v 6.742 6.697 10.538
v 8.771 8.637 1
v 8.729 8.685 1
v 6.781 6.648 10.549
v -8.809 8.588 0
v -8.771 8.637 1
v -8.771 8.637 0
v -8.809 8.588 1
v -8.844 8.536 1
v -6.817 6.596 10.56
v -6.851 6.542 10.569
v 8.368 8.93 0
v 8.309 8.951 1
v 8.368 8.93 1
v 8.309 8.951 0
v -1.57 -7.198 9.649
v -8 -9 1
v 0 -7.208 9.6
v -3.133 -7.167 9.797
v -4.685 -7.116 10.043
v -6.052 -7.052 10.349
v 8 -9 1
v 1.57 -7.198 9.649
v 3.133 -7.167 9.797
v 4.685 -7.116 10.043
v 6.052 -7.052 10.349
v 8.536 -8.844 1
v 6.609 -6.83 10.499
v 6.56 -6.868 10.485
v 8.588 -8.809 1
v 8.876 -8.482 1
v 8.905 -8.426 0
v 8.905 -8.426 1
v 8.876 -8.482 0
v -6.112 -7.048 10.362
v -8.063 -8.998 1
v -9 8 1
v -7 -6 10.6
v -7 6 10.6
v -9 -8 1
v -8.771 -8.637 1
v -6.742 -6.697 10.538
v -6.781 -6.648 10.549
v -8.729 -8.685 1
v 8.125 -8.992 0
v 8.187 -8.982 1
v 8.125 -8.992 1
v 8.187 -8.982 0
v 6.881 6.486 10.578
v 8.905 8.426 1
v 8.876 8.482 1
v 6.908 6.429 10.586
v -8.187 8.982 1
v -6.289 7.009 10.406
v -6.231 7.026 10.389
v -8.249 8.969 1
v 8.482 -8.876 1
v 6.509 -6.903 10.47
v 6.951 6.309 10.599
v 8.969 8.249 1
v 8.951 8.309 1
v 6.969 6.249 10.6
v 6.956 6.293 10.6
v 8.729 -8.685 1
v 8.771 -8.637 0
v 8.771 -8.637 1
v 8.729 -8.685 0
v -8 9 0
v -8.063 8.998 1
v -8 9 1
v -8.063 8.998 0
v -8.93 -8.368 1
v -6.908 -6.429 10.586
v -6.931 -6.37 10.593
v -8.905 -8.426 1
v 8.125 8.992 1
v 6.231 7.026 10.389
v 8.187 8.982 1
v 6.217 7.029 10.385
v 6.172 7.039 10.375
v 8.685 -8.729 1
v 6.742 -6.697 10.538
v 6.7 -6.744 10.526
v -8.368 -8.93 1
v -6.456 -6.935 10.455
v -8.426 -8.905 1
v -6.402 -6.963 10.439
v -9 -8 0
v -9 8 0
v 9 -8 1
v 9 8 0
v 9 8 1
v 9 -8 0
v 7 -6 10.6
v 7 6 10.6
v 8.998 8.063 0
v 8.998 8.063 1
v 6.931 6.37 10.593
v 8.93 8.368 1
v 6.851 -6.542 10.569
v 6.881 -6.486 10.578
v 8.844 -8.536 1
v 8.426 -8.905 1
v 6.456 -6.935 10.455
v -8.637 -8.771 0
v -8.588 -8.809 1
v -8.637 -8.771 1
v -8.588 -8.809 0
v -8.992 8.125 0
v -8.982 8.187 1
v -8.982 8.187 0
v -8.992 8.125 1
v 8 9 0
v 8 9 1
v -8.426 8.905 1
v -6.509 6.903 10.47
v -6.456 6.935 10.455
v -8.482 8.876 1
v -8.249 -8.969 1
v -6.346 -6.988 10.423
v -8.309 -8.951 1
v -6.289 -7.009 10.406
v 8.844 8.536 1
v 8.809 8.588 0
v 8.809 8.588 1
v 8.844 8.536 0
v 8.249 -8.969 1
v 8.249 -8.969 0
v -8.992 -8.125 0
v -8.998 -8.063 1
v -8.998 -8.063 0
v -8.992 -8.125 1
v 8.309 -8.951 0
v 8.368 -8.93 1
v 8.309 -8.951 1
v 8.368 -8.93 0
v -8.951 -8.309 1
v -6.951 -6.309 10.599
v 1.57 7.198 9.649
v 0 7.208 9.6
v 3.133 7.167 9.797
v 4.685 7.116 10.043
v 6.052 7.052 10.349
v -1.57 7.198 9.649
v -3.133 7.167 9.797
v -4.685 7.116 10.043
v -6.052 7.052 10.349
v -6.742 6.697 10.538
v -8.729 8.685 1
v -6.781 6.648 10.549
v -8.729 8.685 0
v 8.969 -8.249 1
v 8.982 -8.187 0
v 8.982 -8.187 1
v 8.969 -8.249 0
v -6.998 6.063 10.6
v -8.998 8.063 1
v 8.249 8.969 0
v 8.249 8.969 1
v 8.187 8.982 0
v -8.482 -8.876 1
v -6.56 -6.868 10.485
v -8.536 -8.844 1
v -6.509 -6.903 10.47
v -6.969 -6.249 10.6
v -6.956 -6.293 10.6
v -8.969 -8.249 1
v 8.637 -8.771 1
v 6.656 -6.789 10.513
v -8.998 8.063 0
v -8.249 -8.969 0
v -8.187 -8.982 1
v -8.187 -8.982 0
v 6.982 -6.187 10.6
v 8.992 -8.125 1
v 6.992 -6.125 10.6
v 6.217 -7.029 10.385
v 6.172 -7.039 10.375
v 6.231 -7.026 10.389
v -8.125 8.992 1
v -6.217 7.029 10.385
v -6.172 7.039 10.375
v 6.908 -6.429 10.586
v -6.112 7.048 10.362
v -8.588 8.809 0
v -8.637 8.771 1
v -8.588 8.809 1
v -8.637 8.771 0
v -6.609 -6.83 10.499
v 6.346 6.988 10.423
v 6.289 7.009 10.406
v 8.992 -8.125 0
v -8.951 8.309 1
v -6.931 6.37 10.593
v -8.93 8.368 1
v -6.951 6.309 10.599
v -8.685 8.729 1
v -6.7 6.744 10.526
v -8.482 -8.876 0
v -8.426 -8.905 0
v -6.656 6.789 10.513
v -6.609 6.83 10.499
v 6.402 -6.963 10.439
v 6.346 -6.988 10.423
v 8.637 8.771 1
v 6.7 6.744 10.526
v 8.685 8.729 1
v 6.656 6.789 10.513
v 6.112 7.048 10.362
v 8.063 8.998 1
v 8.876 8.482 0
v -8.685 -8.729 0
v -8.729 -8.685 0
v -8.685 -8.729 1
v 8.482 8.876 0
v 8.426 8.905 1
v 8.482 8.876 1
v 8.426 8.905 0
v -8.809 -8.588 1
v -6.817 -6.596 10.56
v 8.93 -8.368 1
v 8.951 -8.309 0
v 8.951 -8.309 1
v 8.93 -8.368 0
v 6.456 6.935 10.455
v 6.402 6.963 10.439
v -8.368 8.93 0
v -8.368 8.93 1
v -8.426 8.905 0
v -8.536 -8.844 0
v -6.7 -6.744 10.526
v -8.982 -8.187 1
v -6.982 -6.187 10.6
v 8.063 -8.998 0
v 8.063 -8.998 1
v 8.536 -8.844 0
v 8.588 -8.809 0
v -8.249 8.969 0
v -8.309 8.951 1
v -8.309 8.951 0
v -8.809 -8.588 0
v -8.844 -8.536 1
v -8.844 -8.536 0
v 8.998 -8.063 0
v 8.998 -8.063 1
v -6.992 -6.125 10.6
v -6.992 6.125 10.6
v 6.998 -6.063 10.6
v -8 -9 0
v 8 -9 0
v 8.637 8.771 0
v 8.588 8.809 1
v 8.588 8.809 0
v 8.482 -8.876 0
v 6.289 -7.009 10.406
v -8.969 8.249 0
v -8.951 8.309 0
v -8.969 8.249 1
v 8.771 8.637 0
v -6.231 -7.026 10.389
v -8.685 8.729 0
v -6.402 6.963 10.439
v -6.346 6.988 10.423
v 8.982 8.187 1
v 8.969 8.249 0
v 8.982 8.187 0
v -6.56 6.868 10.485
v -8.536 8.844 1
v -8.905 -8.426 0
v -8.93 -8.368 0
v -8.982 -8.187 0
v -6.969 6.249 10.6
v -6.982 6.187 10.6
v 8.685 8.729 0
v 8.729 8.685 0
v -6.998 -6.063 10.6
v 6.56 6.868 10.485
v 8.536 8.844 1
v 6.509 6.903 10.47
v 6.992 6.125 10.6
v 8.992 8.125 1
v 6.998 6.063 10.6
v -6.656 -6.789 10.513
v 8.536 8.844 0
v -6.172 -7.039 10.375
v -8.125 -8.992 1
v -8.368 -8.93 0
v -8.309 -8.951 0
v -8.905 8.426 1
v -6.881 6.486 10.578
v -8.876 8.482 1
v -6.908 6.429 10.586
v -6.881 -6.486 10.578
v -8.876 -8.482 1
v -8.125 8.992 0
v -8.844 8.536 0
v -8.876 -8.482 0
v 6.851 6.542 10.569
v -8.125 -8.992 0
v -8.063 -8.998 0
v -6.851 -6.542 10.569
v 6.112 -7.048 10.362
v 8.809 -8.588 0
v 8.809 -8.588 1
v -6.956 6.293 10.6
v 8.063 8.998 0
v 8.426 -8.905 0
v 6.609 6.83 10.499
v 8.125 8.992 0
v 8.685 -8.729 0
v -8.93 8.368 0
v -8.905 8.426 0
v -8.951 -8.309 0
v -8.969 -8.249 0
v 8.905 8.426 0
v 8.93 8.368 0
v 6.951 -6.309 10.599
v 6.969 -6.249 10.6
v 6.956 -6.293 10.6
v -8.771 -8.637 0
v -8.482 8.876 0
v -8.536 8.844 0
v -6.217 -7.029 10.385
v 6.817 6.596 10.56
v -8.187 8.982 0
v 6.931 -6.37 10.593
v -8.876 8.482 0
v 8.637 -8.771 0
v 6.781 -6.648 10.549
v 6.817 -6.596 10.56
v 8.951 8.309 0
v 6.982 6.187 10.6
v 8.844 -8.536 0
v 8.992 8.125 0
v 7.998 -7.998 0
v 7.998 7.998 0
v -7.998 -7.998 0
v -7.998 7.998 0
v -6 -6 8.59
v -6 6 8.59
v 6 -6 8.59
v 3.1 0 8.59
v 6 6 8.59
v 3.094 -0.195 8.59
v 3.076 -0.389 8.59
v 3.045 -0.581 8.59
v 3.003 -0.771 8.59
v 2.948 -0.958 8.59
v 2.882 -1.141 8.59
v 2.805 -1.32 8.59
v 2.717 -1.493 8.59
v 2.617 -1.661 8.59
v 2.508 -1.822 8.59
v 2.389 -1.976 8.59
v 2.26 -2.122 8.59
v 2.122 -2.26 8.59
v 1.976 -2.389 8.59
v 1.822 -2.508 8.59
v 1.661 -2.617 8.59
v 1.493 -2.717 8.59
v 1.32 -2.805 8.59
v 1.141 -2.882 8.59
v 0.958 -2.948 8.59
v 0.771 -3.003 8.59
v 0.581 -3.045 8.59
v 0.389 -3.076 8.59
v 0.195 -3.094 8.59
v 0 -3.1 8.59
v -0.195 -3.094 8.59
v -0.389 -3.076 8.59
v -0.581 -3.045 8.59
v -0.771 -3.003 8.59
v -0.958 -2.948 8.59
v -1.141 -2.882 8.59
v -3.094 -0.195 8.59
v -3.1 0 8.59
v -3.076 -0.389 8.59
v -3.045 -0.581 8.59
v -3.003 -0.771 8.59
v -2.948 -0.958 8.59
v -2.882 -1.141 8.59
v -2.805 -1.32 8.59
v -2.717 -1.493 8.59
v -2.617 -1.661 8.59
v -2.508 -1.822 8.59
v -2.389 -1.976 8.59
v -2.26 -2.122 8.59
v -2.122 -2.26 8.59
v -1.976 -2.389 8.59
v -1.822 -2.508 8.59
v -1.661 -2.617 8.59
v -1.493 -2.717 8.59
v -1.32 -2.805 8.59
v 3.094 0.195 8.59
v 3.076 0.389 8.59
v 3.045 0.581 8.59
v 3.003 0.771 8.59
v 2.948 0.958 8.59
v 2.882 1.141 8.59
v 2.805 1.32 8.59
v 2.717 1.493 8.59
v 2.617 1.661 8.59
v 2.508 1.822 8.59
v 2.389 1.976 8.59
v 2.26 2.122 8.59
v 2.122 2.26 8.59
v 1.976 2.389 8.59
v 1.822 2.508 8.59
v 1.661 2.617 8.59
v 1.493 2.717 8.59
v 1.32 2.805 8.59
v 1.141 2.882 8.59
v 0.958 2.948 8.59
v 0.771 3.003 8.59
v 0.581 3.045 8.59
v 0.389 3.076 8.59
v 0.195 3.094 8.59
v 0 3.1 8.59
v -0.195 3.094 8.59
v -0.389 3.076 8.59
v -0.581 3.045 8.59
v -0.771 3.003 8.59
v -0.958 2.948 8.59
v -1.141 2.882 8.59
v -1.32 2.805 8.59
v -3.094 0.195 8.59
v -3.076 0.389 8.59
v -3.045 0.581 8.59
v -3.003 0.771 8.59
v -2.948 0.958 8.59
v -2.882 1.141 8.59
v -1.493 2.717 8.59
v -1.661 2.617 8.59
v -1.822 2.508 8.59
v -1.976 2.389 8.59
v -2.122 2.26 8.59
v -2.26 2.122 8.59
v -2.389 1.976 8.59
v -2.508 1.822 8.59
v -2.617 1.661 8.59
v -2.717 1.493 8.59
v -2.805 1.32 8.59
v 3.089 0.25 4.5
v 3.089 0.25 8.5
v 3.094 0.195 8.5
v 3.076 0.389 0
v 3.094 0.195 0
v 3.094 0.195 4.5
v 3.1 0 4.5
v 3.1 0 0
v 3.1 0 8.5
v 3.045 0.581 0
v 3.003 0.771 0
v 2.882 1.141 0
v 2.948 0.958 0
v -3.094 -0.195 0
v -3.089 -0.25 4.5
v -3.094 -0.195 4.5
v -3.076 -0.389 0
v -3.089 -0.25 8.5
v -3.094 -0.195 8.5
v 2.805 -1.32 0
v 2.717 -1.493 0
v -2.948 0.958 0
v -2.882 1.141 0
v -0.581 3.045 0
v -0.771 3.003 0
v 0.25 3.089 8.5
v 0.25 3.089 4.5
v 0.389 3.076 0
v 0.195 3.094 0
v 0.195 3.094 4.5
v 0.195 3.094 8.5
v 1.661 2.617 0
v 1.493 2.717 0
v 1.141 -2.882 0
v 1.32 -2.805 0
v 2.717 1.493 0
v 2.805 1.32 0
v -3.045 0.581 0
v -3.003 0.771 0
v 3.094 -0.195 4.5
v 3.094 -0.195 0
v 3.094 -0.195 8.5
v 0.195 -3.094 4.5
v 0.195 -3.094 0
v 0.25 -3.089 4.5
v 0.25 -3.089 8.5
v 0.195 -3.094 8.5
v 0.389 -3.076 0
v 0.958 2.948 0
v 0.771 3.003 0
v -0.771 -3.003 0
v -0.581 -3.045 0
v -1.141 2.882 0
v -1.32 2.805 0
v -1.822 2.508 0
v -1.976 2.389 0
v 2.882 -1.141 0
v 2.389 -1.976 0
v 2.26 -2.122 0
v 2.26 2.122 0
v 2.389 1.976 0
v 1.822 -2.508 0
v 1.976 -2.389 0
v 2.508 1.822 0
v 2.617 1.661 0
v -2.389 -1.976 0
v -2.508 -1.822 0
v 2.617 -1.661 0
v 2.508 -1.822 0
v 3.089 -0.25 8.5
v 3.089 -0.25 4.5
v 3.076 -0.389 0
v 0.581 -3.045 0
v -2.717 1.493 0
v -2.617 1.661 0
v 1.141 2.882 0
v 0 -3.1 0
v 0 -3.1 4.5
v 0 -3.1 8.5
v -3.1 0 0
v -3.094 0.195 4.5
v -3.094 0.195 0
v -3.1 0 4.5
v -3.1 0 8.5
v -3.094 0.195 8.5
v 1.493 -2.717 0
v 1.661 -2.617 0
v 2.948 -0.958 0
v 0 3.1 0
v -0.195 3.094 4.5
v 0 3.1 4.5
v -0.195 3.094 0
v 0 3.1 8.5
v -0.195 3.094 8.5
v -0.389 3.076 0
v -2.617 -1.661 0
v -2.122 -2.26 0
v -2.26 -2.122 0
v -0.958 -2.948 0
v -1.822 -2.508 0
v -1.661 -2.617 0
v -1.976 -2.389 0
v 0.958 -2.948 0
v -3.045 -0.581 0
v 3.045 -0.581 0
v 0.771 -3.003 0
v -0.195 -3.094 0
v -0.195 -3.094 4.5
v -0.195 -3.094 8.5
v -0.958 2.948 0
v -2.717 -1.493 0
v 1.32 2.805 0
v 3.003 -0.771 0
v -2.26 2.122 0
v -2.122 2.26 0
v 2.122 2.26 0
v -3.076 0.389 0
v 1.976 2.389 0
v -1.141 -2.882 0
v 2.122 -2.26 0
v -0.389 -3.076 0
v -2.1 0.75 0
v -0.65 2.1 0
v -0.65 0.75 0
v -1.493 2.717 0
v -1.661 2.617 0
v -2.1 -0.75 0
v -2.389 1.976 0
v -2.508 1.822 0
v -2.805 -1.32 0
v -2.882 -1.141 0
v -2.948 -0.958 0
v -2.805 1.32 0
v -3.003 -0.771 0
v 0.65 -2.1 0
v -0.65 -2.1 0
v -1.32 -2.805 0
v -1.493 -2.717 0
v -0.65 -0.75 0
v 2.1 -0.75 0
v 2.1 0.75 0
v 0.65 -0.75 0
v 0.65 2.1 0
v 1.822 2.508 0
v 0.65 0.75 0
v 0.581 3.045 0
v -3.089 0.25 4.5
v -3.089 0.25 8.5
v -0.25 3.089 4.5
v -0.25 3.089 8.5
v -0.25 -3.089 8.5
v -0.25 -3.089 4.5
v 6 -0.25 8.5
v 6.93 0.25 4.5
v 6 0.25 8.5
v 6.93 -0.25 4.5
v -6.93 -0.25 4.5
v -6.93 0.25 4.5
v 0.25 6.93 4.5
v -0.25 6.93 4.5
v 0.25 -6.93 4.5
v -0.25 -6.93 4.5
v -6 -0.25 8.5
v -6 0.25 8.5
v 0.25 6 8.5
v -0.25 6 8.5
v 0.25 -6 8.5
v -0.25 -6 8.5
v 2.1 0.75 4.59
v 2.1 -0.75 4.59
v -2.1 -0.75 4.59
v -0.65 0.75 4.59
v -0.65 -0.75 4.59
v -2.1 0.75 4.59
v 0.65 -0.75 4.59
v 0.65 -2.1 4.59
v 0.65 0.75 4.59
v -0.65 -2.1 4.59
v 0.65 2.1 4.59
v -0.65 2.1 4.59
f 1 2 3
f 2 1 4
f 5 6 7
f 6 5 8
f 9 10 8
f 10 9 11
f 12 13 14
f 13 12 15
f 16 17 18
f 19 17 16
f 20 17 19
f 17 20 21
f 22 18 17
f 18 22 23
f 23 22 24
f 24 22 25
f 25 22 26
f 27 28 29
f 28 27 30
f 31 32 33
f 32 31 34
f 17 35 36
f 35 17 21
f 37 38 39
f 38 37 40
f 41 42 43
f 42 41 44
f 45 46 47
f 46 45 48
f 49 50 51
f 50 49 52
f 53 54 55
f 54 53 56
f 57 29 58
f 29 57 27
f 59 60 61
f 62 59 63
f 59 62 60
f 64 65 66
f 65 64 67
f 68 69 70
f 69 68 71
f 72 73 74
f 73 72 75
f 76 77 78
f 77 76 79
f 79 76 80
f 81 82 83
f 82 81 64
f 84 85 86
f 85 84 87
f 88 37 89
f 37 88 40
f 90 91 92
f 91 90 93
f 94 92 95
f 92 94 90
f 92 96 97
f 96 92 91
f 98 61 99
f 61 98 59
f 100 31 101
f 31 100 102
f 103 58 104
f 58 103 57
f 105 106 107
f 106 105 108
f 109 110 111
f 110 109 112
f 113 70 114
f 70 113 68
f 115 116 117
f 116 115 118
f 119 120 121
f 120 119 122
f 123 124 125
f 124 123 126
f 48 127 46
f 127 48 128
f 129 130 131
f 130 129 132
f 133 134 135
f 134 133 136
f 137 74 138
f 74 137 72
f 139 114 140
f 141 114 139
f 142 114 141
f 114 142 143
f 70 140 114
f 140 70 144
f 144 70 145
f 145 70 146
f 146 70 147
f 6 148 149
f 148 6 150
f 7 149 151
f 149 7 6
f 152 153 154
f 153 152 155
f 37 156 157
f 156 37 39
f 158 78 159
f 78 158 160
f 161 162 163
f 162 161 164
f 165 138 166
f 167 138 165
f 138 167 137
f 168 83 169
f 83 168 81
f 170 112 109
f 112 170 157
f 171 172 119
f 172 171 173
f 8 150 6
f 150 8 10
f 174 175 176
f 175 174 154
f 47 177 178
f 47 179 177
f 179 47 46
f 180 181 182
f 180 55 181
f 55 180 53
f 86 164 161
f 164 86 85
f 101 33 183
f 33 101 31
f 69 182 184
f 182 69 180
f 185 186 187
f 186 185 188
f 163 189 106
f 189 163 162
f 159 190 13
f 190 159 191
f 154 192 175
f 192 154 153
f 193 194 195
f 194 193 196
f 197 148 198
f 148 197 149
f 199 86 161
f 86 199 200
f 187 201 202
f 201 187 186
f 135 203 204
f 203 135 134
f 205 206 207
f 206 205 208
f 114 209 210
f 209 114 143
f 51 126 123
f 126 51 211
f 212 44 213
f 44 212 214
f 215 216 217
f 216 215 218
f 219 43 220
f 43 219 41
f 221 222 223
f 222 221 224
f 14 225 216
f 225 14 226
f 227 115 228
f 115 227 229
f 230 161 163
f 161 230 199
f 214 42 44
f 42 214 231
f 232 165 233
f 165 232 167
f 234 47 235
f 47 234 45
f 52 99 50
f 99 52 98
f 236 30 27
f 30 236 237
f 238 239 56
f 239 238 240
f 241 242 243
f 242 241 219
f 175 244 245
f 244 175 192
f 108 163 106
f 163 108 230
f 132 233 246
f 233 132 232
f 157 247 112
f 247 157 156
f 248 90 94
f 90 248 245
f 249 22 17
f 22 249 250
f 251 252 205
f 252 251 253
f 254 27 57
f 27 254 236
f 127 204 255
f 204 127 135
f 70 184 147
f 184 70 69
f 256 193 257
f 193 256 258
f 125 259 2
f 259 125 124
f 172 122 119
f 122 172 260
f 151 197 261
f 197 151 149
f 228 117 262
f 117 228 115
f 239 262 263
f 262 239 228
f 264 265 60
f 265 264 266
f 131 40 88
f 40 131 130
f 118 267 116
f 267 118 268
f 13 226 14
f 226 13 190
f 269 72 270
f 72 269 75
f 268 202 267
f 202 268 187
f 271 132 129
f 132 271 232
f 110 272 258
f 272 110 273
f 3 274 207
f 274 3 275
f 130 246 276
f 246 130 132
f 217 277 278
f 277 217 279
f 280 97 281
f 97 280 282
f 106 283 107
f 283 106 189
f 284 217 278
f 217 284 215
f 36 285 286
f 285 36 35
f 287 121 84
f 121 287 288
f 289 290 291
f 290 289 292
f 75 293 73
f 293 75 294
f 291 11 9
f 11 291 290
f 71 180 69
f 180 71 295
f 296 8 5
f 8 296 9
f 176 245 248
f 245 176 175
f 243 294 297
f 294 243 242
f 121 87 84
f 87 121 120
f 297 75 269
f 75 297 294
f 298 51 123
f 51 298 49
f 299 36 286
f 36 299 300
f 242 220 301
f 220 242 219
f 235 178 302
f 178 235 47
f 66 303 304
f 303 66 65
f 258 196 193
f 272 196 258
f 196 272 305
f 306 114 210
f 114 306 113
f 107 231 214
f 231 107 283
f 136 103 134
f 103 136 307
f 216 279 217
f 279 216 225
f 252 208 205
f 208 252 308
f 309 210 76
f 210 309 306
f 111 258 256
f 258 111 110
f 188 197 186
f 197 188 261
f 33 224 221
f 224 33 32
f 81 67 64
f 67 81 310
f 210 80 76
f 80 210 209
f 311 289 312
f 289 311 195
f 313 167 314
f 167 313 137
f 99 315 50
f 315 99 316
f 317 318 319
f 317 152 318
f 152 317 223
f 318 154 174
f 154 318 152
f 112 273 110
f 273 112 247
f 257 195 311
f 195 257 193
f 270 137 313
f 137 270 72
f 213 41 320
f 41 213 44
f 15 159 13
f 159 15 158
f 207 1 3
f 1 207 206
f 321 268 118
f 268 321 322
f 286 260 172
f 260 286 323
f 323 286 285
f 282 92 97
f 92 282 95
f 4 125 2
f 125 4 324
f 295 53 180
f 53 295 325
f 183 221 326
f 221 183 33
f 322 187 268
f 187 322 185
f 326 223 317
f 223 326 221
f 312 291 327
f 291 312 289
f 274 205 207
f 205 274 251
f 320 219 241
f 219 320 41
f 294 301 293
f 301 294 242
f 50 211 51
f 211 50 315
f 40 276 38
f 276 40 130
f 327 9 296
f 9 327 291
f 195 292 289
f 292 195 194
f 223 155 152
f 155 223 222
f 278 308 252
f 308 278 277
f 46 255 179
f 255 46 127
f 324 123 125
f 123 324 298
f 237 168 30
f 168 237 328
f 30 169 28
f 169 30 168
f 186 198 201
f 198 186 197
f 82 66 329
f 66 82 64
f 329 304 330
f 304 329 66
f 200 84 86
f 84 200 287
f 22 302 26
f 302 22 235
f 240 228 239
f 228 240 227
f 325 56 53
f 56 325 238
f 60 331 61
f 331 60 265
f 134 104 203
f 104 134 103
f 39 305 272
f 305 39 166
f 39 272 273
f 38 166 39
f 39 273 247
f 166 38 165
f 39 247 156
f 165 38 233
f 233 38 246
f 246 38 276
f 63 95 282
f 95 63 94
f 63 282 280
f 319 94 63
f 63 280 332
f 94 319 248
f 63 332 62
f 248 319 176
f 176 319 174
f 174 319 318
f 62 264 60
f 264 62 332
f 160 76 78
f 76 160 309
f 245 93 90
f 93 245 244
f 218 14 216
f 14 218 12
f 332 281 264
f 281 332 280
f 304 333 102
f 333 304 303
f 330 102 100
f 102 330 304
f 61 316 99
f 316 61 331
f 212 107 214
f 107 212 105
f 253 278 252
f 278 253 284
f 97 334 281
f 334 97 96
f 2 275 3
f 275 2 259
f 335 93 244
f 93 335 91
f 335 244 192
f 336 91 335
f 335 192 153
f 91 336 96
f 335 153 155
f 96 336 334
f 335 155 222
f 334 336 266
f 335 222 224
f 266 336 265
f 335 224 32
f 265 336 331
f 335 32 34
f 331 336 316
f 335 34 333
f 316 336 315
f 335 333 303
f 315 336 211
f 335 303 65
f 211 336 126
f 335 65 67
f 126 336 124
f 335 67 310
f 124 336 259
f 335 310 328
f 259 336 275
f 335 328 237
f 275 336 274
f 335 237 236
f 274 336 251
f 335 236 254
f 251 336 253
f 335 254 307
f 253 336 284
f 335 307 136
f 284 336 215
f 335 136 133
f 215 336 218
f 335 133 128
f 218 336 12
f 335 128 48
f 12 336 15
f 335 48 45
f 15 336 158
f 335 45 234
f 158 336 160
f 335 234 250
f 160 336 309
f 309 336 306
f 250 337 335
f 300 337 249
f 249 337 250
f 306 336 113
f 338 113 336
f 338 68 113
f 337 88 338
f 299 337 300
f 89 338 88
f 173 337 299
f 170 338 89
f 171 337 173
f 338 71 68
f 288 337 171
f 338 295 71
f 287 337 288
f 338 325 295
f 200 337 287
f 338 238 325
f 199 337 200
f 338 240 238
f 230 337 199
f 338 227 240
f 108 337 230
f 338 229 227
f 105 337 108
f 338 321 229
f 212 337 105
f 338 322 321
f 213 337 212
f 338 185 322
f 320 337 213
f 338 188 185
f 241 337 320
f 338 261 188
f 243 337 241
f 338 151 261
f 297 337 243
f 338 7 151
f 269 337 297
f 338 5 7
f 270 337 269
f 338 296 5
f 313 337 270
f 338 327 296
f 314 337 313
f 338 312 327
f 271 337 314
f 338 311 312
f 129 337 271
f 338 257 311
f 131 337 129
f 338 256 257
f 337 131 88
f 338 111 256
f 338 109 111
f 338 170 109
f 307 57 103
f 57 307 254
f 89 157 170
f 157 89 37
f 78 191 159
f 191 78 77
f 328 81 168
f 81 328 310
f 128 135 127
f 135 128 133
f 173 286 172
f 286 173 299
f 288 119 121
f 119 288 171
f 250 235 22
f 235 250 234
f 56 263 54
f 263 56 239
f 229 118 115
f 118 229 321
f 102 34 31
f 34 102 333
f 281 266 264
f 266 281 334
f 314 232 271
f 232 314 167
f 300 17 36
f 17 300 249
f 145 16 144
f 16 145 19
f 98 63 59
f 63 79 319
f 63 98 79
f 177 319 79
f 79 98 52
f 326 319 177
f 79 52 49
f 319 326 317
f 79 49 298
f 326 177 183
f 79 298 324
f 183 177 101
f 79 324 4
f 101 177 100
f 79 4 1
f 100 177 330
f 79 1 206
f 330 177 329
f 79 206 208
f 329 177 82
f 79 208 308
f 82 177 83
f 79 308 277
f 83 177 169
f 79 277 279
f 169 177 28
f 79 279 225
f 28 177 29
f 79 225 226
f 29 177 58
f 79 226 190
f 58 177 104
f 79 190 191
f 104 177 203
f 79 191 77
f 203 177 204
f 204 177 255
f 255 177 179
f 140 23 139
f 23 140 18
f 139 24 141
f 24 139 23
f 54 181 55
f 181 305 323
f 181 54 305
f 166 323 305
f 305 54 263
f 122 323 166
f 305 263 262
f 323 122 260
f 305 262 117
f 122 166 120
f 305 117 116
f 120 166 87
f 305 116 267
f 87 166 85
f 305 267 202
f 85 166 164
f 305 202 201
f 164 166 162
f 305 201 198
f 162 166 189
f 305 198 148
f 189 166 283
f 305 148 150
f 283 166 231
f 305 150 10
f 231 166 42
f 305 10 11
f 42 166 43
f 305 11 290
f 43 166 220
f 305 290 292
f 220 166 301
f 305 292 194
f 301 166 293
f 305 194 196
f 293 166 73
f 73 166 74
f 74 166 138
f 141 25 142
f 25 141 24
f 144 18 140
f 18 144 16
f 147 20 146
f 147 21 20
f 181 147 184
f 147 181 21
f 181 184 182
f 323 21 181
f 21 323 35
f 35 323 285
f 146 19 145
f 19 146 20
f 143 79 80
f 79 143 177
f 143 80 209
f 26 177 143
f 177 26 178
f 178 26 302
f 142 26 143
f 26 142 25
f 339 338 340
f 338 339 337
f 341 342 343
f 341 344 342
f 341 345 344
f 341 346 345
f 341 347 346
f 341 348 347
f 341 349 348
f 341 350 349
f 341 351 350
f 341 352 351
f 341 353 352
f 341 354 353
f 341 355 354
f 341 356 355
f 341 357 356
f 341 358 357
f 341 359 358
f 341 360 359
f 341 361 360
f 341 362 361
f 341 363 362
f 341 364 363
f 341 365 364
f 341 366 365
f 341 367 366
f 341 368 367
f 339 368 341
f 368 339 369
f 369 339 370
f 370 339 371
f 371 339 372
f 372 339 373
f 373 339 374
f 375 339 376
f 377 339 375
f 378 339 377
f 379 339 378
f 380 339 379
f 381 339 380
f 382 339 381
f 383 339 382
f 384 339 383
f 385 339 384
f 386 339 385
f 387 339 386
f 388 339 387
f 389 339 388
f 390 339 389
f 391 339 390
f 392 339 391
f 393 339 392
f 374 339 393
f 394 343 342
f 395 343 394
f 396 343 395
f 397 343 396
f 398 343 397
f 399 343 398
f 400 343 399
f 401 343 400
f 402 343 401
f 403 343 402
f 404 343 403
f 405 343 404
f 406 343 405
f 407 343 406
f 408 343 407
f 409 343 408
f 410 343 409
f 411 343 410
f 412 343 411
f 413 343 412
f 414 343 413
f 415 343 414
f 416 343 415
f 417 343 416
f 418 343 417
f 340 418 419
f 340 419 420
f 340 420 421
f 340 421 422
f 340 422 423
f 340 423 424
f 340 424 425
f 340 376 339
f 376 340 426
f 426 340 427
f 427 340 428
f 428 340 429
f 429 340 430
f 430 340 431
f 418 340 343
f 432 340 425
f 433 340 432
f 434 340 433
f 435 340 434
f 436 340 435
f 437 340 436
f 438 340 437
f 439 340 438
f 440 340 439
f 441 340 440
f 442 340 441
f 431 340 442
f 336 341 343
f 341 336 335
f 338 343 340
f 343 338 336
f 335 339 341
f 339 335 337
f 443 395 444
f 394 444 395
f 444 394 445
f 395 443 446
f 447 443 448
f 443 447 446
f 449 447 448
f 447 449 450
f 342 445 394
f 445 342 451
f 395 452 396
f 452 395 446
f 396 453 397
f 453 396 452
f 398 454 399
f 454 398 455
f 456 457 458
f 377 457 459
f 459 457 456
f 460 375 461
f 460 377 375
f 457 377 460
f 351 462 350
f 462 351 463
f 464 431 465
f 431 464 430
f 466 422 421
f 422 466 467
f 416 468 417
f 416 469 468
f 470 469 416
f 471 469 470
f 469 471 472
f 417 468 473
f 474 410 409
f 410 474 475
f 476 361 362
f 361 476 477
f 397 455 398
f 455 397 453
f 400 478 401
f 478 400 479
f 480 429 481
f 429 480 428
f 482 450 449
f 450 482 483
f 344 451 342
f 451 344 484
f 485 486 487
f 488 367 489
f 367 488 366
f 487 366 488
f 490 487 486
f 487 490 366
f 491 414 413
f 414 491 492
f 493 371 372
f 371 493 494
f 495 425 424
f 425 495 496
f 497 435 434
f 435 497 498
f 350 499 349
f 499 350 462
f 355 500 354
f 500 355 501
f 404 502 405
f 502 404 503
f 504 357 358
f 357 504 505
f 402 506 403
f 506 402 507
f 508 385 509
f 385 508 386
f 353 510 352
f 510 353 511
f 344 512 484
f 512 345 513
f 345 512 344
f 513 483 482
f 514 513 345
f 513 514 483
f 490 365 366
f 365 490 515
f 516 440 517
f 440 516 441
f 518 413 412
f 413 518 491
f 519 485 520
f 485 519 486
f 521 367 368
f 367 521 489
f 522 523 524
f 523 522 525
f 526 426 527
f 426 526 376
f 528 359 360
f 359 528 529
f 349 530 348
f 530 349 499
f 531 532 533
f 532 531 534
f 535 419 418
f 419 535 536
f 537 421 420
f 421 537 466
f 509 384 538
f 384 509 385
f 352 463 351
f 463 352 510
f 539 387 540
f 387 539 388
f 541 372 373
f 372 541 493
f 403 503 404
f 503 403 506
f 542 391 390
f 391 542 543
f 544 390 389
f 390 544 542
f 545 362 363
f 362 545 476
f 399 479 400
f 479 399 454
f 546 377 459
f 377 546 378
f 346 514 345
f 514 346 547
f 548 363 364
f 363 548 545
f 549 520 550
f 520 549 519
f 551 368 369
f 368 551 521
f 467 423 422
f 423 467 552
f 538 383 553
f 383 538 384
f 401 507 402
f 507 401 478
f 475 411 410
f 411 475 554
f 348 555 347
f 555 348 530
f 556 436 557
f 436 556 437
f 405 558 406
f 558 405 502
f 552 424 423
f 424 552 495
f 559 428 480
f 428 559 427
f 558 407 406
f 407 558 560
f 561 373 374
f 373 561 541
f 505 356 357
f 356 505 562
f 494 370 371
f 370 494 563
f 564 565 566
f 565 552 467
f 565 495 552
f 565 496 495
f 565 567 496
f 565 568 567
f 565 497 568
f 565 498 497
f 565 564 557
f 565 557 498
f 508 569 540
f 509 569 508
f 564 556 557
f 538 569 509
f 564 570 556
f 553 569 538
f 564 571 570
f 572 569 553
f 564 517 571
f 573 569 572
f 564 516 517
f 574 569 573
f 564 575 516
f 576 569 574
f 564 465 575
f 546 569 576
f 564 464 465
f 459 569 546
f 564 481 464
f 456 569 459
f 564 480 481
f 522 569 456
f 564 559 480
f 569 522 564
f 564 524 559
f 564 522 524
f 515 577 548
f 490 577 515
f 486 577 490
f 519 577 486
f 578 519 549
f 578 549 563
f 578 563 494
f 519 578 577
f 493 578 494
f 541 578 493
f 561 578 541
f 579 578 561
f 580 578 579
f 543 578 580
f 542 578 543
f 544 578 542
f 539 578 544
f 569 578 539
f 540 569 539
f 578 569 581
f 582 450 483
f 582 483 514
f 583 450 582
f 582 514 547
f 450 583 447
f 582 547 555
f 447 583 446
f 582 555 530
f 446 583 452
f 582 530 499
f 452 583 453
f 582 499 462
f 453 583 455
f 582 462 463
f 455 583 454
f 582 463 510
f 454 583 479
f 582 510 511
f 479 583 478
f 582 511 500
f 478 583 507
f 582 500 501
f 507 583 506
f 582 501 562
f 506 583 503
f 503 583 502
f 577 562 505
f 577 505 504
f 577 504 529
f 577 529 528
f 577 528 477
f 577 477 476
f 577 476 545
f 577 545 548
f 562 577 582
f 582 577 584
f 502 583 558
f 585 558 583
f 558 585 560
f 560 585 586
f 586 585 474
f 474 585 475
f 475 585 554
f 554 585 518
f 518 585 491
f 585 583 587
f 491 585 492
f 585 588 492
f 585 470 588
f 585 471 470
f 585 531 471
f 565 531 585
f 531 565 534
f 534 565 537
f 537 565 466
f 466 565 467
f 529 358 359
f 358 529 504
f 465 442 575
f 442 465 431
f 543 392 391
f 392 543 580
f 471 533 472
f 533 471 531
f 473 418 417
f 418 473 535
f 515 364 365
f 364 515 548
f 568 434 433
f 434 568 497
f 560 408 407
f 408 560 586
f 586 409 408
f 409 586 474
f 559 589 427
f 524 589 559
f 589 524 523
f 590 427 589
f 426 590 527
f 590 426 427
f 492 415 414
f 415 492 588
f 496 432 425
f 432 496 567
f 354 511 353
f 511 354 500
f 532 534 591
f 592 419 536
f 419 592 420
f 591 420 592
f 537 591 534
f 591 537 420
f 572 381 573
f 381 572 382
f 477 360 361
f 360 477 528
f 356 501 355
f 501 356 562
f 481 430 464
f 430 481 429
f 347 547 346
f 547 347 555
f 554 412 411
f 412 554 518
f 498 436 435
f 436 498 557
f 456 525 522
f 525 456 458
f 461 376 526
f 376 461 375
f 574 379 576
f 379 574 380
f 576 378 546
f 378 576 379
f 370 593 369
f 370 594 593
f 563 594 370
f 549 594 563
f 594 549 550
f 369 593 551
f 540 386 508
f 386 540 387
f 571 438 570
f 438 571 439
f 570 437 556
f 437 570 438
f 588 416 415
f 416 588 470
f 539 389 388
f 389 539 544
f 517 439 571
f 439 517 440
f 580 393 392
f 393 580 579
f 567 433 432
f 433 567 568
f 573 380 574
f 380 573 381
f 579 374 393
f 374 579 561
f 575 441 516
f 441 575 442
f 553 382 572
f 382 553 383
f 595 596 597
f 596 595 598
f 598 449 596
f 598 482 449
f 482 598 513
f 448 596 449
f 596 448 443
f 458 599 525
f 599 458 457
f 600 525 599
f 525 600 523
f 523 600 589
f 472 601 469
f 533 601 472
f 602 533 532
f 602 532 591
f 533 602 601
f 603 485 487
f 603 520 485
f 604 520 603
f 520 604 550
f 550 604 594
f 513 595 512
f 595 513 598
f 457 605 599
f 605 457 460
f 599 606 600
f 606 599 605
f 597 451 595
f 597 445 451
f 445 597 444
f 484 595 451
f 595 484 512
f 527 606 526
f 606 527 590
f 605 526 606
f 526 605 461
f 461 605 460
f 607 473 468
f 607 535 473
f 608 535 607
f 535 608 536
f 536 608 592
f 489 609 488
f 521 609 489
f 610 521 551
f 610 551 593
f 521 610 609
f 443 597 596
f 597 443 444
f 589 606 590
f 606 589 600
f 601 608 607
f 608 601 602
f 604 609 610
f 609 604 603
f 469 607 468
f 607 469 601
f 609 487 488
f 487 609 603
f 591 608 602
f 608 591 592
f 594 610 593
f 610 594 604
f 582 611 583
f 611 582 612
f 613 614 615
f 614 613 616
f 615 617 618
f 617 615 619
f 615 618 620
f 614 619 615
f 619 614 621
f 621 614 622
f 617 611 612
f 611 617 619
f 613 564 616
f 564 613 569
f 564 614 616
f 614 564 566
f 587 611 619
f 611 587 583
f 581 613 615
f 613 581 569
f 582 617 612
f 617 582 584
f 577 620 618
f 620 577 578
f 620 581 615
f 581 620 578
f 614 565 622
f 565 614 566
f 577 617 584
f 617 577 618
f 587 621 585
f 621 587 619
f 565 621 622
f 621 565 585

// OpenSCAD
// --- config --- //
$fn     = 100;
stem_l  = 4;
stem_h  = 3.6;
stem_th = 1.1;
stem_tv = 1.3;
extra_h = 4;
cap_t   = 1;
// -------------- //

margin     = 0.1;
curve_r    = 25;
curve_h    = 2;
rod_hole_h = stem_h + 1;
rod_h      = rod_hole_h + extra_h;
rod_r      = (stem_l / 2) + margin + 1;
cap_lb     = 18;
cap_lt     = 14;
cavity_lb  = cap_lb - (2 * cap_t);
cavity_lt  = cap_lt - (2 * cap_t);
rib_t      = 0.5;
rib_lb     = cavity_lt + ((extra_h / rod_h) * (cavity_lb -cavity_lt));

module frustum(lb, lt, h) {
    linear_extrude(height = h, scale = lt / lb) {
        square([lb, lb], center = true);
    }
}

module rib() {
    translate([0, (rib_t / 2), extra_h + 0.5])
        rotate([90, 0, 0])
            linear_extrude(height = rib_t)
                polygon(points = [
                    [-(rib_lb / 2), 0],
                    [(rib_lb / 2), 0],
                    [(cavity_lt / 2), extra_h],
                    [-(cavity_lt / 2), extra_h]
                ]);
}

module rod_hole(stem_t) {
    translate([0, 0, (rod_hole_h / 2) - 0.01])
        cube([stem_l + (2 * margin),
              stem_t + (2 * margin),
              rod_hole_h],
              center = true
        );
}


union() {
    difference() {
        difference() {
            minkowski() {
                frustum(cavity_lb, cavity_lt, rod_h + curve_h - 1);
                cylinder(r = cap_t, h = 1);
            }
            translate([0, 0, curve_r + rod_h + cap_t])
                rotate([90, 0, 0])
                    cylinder(r = curve_r, h = cap_lb, center = true);
        }
        translate([0, 0, -0.01])
            frustum(cavity_lb, cavity_lt, rod_h);
    }

    difference() {
        union() {
            translate([0, 0, (rod_h / 2)])
                cylinder(r = rod_r, h = rod_h, center = true);
            
            rib();
            rotate([0, 0, 90])
                rib();
        }

        rod_hole(stem_tv);
        rotate([0, 0, 90])
            rod_hole(stem_th);
    }
}
